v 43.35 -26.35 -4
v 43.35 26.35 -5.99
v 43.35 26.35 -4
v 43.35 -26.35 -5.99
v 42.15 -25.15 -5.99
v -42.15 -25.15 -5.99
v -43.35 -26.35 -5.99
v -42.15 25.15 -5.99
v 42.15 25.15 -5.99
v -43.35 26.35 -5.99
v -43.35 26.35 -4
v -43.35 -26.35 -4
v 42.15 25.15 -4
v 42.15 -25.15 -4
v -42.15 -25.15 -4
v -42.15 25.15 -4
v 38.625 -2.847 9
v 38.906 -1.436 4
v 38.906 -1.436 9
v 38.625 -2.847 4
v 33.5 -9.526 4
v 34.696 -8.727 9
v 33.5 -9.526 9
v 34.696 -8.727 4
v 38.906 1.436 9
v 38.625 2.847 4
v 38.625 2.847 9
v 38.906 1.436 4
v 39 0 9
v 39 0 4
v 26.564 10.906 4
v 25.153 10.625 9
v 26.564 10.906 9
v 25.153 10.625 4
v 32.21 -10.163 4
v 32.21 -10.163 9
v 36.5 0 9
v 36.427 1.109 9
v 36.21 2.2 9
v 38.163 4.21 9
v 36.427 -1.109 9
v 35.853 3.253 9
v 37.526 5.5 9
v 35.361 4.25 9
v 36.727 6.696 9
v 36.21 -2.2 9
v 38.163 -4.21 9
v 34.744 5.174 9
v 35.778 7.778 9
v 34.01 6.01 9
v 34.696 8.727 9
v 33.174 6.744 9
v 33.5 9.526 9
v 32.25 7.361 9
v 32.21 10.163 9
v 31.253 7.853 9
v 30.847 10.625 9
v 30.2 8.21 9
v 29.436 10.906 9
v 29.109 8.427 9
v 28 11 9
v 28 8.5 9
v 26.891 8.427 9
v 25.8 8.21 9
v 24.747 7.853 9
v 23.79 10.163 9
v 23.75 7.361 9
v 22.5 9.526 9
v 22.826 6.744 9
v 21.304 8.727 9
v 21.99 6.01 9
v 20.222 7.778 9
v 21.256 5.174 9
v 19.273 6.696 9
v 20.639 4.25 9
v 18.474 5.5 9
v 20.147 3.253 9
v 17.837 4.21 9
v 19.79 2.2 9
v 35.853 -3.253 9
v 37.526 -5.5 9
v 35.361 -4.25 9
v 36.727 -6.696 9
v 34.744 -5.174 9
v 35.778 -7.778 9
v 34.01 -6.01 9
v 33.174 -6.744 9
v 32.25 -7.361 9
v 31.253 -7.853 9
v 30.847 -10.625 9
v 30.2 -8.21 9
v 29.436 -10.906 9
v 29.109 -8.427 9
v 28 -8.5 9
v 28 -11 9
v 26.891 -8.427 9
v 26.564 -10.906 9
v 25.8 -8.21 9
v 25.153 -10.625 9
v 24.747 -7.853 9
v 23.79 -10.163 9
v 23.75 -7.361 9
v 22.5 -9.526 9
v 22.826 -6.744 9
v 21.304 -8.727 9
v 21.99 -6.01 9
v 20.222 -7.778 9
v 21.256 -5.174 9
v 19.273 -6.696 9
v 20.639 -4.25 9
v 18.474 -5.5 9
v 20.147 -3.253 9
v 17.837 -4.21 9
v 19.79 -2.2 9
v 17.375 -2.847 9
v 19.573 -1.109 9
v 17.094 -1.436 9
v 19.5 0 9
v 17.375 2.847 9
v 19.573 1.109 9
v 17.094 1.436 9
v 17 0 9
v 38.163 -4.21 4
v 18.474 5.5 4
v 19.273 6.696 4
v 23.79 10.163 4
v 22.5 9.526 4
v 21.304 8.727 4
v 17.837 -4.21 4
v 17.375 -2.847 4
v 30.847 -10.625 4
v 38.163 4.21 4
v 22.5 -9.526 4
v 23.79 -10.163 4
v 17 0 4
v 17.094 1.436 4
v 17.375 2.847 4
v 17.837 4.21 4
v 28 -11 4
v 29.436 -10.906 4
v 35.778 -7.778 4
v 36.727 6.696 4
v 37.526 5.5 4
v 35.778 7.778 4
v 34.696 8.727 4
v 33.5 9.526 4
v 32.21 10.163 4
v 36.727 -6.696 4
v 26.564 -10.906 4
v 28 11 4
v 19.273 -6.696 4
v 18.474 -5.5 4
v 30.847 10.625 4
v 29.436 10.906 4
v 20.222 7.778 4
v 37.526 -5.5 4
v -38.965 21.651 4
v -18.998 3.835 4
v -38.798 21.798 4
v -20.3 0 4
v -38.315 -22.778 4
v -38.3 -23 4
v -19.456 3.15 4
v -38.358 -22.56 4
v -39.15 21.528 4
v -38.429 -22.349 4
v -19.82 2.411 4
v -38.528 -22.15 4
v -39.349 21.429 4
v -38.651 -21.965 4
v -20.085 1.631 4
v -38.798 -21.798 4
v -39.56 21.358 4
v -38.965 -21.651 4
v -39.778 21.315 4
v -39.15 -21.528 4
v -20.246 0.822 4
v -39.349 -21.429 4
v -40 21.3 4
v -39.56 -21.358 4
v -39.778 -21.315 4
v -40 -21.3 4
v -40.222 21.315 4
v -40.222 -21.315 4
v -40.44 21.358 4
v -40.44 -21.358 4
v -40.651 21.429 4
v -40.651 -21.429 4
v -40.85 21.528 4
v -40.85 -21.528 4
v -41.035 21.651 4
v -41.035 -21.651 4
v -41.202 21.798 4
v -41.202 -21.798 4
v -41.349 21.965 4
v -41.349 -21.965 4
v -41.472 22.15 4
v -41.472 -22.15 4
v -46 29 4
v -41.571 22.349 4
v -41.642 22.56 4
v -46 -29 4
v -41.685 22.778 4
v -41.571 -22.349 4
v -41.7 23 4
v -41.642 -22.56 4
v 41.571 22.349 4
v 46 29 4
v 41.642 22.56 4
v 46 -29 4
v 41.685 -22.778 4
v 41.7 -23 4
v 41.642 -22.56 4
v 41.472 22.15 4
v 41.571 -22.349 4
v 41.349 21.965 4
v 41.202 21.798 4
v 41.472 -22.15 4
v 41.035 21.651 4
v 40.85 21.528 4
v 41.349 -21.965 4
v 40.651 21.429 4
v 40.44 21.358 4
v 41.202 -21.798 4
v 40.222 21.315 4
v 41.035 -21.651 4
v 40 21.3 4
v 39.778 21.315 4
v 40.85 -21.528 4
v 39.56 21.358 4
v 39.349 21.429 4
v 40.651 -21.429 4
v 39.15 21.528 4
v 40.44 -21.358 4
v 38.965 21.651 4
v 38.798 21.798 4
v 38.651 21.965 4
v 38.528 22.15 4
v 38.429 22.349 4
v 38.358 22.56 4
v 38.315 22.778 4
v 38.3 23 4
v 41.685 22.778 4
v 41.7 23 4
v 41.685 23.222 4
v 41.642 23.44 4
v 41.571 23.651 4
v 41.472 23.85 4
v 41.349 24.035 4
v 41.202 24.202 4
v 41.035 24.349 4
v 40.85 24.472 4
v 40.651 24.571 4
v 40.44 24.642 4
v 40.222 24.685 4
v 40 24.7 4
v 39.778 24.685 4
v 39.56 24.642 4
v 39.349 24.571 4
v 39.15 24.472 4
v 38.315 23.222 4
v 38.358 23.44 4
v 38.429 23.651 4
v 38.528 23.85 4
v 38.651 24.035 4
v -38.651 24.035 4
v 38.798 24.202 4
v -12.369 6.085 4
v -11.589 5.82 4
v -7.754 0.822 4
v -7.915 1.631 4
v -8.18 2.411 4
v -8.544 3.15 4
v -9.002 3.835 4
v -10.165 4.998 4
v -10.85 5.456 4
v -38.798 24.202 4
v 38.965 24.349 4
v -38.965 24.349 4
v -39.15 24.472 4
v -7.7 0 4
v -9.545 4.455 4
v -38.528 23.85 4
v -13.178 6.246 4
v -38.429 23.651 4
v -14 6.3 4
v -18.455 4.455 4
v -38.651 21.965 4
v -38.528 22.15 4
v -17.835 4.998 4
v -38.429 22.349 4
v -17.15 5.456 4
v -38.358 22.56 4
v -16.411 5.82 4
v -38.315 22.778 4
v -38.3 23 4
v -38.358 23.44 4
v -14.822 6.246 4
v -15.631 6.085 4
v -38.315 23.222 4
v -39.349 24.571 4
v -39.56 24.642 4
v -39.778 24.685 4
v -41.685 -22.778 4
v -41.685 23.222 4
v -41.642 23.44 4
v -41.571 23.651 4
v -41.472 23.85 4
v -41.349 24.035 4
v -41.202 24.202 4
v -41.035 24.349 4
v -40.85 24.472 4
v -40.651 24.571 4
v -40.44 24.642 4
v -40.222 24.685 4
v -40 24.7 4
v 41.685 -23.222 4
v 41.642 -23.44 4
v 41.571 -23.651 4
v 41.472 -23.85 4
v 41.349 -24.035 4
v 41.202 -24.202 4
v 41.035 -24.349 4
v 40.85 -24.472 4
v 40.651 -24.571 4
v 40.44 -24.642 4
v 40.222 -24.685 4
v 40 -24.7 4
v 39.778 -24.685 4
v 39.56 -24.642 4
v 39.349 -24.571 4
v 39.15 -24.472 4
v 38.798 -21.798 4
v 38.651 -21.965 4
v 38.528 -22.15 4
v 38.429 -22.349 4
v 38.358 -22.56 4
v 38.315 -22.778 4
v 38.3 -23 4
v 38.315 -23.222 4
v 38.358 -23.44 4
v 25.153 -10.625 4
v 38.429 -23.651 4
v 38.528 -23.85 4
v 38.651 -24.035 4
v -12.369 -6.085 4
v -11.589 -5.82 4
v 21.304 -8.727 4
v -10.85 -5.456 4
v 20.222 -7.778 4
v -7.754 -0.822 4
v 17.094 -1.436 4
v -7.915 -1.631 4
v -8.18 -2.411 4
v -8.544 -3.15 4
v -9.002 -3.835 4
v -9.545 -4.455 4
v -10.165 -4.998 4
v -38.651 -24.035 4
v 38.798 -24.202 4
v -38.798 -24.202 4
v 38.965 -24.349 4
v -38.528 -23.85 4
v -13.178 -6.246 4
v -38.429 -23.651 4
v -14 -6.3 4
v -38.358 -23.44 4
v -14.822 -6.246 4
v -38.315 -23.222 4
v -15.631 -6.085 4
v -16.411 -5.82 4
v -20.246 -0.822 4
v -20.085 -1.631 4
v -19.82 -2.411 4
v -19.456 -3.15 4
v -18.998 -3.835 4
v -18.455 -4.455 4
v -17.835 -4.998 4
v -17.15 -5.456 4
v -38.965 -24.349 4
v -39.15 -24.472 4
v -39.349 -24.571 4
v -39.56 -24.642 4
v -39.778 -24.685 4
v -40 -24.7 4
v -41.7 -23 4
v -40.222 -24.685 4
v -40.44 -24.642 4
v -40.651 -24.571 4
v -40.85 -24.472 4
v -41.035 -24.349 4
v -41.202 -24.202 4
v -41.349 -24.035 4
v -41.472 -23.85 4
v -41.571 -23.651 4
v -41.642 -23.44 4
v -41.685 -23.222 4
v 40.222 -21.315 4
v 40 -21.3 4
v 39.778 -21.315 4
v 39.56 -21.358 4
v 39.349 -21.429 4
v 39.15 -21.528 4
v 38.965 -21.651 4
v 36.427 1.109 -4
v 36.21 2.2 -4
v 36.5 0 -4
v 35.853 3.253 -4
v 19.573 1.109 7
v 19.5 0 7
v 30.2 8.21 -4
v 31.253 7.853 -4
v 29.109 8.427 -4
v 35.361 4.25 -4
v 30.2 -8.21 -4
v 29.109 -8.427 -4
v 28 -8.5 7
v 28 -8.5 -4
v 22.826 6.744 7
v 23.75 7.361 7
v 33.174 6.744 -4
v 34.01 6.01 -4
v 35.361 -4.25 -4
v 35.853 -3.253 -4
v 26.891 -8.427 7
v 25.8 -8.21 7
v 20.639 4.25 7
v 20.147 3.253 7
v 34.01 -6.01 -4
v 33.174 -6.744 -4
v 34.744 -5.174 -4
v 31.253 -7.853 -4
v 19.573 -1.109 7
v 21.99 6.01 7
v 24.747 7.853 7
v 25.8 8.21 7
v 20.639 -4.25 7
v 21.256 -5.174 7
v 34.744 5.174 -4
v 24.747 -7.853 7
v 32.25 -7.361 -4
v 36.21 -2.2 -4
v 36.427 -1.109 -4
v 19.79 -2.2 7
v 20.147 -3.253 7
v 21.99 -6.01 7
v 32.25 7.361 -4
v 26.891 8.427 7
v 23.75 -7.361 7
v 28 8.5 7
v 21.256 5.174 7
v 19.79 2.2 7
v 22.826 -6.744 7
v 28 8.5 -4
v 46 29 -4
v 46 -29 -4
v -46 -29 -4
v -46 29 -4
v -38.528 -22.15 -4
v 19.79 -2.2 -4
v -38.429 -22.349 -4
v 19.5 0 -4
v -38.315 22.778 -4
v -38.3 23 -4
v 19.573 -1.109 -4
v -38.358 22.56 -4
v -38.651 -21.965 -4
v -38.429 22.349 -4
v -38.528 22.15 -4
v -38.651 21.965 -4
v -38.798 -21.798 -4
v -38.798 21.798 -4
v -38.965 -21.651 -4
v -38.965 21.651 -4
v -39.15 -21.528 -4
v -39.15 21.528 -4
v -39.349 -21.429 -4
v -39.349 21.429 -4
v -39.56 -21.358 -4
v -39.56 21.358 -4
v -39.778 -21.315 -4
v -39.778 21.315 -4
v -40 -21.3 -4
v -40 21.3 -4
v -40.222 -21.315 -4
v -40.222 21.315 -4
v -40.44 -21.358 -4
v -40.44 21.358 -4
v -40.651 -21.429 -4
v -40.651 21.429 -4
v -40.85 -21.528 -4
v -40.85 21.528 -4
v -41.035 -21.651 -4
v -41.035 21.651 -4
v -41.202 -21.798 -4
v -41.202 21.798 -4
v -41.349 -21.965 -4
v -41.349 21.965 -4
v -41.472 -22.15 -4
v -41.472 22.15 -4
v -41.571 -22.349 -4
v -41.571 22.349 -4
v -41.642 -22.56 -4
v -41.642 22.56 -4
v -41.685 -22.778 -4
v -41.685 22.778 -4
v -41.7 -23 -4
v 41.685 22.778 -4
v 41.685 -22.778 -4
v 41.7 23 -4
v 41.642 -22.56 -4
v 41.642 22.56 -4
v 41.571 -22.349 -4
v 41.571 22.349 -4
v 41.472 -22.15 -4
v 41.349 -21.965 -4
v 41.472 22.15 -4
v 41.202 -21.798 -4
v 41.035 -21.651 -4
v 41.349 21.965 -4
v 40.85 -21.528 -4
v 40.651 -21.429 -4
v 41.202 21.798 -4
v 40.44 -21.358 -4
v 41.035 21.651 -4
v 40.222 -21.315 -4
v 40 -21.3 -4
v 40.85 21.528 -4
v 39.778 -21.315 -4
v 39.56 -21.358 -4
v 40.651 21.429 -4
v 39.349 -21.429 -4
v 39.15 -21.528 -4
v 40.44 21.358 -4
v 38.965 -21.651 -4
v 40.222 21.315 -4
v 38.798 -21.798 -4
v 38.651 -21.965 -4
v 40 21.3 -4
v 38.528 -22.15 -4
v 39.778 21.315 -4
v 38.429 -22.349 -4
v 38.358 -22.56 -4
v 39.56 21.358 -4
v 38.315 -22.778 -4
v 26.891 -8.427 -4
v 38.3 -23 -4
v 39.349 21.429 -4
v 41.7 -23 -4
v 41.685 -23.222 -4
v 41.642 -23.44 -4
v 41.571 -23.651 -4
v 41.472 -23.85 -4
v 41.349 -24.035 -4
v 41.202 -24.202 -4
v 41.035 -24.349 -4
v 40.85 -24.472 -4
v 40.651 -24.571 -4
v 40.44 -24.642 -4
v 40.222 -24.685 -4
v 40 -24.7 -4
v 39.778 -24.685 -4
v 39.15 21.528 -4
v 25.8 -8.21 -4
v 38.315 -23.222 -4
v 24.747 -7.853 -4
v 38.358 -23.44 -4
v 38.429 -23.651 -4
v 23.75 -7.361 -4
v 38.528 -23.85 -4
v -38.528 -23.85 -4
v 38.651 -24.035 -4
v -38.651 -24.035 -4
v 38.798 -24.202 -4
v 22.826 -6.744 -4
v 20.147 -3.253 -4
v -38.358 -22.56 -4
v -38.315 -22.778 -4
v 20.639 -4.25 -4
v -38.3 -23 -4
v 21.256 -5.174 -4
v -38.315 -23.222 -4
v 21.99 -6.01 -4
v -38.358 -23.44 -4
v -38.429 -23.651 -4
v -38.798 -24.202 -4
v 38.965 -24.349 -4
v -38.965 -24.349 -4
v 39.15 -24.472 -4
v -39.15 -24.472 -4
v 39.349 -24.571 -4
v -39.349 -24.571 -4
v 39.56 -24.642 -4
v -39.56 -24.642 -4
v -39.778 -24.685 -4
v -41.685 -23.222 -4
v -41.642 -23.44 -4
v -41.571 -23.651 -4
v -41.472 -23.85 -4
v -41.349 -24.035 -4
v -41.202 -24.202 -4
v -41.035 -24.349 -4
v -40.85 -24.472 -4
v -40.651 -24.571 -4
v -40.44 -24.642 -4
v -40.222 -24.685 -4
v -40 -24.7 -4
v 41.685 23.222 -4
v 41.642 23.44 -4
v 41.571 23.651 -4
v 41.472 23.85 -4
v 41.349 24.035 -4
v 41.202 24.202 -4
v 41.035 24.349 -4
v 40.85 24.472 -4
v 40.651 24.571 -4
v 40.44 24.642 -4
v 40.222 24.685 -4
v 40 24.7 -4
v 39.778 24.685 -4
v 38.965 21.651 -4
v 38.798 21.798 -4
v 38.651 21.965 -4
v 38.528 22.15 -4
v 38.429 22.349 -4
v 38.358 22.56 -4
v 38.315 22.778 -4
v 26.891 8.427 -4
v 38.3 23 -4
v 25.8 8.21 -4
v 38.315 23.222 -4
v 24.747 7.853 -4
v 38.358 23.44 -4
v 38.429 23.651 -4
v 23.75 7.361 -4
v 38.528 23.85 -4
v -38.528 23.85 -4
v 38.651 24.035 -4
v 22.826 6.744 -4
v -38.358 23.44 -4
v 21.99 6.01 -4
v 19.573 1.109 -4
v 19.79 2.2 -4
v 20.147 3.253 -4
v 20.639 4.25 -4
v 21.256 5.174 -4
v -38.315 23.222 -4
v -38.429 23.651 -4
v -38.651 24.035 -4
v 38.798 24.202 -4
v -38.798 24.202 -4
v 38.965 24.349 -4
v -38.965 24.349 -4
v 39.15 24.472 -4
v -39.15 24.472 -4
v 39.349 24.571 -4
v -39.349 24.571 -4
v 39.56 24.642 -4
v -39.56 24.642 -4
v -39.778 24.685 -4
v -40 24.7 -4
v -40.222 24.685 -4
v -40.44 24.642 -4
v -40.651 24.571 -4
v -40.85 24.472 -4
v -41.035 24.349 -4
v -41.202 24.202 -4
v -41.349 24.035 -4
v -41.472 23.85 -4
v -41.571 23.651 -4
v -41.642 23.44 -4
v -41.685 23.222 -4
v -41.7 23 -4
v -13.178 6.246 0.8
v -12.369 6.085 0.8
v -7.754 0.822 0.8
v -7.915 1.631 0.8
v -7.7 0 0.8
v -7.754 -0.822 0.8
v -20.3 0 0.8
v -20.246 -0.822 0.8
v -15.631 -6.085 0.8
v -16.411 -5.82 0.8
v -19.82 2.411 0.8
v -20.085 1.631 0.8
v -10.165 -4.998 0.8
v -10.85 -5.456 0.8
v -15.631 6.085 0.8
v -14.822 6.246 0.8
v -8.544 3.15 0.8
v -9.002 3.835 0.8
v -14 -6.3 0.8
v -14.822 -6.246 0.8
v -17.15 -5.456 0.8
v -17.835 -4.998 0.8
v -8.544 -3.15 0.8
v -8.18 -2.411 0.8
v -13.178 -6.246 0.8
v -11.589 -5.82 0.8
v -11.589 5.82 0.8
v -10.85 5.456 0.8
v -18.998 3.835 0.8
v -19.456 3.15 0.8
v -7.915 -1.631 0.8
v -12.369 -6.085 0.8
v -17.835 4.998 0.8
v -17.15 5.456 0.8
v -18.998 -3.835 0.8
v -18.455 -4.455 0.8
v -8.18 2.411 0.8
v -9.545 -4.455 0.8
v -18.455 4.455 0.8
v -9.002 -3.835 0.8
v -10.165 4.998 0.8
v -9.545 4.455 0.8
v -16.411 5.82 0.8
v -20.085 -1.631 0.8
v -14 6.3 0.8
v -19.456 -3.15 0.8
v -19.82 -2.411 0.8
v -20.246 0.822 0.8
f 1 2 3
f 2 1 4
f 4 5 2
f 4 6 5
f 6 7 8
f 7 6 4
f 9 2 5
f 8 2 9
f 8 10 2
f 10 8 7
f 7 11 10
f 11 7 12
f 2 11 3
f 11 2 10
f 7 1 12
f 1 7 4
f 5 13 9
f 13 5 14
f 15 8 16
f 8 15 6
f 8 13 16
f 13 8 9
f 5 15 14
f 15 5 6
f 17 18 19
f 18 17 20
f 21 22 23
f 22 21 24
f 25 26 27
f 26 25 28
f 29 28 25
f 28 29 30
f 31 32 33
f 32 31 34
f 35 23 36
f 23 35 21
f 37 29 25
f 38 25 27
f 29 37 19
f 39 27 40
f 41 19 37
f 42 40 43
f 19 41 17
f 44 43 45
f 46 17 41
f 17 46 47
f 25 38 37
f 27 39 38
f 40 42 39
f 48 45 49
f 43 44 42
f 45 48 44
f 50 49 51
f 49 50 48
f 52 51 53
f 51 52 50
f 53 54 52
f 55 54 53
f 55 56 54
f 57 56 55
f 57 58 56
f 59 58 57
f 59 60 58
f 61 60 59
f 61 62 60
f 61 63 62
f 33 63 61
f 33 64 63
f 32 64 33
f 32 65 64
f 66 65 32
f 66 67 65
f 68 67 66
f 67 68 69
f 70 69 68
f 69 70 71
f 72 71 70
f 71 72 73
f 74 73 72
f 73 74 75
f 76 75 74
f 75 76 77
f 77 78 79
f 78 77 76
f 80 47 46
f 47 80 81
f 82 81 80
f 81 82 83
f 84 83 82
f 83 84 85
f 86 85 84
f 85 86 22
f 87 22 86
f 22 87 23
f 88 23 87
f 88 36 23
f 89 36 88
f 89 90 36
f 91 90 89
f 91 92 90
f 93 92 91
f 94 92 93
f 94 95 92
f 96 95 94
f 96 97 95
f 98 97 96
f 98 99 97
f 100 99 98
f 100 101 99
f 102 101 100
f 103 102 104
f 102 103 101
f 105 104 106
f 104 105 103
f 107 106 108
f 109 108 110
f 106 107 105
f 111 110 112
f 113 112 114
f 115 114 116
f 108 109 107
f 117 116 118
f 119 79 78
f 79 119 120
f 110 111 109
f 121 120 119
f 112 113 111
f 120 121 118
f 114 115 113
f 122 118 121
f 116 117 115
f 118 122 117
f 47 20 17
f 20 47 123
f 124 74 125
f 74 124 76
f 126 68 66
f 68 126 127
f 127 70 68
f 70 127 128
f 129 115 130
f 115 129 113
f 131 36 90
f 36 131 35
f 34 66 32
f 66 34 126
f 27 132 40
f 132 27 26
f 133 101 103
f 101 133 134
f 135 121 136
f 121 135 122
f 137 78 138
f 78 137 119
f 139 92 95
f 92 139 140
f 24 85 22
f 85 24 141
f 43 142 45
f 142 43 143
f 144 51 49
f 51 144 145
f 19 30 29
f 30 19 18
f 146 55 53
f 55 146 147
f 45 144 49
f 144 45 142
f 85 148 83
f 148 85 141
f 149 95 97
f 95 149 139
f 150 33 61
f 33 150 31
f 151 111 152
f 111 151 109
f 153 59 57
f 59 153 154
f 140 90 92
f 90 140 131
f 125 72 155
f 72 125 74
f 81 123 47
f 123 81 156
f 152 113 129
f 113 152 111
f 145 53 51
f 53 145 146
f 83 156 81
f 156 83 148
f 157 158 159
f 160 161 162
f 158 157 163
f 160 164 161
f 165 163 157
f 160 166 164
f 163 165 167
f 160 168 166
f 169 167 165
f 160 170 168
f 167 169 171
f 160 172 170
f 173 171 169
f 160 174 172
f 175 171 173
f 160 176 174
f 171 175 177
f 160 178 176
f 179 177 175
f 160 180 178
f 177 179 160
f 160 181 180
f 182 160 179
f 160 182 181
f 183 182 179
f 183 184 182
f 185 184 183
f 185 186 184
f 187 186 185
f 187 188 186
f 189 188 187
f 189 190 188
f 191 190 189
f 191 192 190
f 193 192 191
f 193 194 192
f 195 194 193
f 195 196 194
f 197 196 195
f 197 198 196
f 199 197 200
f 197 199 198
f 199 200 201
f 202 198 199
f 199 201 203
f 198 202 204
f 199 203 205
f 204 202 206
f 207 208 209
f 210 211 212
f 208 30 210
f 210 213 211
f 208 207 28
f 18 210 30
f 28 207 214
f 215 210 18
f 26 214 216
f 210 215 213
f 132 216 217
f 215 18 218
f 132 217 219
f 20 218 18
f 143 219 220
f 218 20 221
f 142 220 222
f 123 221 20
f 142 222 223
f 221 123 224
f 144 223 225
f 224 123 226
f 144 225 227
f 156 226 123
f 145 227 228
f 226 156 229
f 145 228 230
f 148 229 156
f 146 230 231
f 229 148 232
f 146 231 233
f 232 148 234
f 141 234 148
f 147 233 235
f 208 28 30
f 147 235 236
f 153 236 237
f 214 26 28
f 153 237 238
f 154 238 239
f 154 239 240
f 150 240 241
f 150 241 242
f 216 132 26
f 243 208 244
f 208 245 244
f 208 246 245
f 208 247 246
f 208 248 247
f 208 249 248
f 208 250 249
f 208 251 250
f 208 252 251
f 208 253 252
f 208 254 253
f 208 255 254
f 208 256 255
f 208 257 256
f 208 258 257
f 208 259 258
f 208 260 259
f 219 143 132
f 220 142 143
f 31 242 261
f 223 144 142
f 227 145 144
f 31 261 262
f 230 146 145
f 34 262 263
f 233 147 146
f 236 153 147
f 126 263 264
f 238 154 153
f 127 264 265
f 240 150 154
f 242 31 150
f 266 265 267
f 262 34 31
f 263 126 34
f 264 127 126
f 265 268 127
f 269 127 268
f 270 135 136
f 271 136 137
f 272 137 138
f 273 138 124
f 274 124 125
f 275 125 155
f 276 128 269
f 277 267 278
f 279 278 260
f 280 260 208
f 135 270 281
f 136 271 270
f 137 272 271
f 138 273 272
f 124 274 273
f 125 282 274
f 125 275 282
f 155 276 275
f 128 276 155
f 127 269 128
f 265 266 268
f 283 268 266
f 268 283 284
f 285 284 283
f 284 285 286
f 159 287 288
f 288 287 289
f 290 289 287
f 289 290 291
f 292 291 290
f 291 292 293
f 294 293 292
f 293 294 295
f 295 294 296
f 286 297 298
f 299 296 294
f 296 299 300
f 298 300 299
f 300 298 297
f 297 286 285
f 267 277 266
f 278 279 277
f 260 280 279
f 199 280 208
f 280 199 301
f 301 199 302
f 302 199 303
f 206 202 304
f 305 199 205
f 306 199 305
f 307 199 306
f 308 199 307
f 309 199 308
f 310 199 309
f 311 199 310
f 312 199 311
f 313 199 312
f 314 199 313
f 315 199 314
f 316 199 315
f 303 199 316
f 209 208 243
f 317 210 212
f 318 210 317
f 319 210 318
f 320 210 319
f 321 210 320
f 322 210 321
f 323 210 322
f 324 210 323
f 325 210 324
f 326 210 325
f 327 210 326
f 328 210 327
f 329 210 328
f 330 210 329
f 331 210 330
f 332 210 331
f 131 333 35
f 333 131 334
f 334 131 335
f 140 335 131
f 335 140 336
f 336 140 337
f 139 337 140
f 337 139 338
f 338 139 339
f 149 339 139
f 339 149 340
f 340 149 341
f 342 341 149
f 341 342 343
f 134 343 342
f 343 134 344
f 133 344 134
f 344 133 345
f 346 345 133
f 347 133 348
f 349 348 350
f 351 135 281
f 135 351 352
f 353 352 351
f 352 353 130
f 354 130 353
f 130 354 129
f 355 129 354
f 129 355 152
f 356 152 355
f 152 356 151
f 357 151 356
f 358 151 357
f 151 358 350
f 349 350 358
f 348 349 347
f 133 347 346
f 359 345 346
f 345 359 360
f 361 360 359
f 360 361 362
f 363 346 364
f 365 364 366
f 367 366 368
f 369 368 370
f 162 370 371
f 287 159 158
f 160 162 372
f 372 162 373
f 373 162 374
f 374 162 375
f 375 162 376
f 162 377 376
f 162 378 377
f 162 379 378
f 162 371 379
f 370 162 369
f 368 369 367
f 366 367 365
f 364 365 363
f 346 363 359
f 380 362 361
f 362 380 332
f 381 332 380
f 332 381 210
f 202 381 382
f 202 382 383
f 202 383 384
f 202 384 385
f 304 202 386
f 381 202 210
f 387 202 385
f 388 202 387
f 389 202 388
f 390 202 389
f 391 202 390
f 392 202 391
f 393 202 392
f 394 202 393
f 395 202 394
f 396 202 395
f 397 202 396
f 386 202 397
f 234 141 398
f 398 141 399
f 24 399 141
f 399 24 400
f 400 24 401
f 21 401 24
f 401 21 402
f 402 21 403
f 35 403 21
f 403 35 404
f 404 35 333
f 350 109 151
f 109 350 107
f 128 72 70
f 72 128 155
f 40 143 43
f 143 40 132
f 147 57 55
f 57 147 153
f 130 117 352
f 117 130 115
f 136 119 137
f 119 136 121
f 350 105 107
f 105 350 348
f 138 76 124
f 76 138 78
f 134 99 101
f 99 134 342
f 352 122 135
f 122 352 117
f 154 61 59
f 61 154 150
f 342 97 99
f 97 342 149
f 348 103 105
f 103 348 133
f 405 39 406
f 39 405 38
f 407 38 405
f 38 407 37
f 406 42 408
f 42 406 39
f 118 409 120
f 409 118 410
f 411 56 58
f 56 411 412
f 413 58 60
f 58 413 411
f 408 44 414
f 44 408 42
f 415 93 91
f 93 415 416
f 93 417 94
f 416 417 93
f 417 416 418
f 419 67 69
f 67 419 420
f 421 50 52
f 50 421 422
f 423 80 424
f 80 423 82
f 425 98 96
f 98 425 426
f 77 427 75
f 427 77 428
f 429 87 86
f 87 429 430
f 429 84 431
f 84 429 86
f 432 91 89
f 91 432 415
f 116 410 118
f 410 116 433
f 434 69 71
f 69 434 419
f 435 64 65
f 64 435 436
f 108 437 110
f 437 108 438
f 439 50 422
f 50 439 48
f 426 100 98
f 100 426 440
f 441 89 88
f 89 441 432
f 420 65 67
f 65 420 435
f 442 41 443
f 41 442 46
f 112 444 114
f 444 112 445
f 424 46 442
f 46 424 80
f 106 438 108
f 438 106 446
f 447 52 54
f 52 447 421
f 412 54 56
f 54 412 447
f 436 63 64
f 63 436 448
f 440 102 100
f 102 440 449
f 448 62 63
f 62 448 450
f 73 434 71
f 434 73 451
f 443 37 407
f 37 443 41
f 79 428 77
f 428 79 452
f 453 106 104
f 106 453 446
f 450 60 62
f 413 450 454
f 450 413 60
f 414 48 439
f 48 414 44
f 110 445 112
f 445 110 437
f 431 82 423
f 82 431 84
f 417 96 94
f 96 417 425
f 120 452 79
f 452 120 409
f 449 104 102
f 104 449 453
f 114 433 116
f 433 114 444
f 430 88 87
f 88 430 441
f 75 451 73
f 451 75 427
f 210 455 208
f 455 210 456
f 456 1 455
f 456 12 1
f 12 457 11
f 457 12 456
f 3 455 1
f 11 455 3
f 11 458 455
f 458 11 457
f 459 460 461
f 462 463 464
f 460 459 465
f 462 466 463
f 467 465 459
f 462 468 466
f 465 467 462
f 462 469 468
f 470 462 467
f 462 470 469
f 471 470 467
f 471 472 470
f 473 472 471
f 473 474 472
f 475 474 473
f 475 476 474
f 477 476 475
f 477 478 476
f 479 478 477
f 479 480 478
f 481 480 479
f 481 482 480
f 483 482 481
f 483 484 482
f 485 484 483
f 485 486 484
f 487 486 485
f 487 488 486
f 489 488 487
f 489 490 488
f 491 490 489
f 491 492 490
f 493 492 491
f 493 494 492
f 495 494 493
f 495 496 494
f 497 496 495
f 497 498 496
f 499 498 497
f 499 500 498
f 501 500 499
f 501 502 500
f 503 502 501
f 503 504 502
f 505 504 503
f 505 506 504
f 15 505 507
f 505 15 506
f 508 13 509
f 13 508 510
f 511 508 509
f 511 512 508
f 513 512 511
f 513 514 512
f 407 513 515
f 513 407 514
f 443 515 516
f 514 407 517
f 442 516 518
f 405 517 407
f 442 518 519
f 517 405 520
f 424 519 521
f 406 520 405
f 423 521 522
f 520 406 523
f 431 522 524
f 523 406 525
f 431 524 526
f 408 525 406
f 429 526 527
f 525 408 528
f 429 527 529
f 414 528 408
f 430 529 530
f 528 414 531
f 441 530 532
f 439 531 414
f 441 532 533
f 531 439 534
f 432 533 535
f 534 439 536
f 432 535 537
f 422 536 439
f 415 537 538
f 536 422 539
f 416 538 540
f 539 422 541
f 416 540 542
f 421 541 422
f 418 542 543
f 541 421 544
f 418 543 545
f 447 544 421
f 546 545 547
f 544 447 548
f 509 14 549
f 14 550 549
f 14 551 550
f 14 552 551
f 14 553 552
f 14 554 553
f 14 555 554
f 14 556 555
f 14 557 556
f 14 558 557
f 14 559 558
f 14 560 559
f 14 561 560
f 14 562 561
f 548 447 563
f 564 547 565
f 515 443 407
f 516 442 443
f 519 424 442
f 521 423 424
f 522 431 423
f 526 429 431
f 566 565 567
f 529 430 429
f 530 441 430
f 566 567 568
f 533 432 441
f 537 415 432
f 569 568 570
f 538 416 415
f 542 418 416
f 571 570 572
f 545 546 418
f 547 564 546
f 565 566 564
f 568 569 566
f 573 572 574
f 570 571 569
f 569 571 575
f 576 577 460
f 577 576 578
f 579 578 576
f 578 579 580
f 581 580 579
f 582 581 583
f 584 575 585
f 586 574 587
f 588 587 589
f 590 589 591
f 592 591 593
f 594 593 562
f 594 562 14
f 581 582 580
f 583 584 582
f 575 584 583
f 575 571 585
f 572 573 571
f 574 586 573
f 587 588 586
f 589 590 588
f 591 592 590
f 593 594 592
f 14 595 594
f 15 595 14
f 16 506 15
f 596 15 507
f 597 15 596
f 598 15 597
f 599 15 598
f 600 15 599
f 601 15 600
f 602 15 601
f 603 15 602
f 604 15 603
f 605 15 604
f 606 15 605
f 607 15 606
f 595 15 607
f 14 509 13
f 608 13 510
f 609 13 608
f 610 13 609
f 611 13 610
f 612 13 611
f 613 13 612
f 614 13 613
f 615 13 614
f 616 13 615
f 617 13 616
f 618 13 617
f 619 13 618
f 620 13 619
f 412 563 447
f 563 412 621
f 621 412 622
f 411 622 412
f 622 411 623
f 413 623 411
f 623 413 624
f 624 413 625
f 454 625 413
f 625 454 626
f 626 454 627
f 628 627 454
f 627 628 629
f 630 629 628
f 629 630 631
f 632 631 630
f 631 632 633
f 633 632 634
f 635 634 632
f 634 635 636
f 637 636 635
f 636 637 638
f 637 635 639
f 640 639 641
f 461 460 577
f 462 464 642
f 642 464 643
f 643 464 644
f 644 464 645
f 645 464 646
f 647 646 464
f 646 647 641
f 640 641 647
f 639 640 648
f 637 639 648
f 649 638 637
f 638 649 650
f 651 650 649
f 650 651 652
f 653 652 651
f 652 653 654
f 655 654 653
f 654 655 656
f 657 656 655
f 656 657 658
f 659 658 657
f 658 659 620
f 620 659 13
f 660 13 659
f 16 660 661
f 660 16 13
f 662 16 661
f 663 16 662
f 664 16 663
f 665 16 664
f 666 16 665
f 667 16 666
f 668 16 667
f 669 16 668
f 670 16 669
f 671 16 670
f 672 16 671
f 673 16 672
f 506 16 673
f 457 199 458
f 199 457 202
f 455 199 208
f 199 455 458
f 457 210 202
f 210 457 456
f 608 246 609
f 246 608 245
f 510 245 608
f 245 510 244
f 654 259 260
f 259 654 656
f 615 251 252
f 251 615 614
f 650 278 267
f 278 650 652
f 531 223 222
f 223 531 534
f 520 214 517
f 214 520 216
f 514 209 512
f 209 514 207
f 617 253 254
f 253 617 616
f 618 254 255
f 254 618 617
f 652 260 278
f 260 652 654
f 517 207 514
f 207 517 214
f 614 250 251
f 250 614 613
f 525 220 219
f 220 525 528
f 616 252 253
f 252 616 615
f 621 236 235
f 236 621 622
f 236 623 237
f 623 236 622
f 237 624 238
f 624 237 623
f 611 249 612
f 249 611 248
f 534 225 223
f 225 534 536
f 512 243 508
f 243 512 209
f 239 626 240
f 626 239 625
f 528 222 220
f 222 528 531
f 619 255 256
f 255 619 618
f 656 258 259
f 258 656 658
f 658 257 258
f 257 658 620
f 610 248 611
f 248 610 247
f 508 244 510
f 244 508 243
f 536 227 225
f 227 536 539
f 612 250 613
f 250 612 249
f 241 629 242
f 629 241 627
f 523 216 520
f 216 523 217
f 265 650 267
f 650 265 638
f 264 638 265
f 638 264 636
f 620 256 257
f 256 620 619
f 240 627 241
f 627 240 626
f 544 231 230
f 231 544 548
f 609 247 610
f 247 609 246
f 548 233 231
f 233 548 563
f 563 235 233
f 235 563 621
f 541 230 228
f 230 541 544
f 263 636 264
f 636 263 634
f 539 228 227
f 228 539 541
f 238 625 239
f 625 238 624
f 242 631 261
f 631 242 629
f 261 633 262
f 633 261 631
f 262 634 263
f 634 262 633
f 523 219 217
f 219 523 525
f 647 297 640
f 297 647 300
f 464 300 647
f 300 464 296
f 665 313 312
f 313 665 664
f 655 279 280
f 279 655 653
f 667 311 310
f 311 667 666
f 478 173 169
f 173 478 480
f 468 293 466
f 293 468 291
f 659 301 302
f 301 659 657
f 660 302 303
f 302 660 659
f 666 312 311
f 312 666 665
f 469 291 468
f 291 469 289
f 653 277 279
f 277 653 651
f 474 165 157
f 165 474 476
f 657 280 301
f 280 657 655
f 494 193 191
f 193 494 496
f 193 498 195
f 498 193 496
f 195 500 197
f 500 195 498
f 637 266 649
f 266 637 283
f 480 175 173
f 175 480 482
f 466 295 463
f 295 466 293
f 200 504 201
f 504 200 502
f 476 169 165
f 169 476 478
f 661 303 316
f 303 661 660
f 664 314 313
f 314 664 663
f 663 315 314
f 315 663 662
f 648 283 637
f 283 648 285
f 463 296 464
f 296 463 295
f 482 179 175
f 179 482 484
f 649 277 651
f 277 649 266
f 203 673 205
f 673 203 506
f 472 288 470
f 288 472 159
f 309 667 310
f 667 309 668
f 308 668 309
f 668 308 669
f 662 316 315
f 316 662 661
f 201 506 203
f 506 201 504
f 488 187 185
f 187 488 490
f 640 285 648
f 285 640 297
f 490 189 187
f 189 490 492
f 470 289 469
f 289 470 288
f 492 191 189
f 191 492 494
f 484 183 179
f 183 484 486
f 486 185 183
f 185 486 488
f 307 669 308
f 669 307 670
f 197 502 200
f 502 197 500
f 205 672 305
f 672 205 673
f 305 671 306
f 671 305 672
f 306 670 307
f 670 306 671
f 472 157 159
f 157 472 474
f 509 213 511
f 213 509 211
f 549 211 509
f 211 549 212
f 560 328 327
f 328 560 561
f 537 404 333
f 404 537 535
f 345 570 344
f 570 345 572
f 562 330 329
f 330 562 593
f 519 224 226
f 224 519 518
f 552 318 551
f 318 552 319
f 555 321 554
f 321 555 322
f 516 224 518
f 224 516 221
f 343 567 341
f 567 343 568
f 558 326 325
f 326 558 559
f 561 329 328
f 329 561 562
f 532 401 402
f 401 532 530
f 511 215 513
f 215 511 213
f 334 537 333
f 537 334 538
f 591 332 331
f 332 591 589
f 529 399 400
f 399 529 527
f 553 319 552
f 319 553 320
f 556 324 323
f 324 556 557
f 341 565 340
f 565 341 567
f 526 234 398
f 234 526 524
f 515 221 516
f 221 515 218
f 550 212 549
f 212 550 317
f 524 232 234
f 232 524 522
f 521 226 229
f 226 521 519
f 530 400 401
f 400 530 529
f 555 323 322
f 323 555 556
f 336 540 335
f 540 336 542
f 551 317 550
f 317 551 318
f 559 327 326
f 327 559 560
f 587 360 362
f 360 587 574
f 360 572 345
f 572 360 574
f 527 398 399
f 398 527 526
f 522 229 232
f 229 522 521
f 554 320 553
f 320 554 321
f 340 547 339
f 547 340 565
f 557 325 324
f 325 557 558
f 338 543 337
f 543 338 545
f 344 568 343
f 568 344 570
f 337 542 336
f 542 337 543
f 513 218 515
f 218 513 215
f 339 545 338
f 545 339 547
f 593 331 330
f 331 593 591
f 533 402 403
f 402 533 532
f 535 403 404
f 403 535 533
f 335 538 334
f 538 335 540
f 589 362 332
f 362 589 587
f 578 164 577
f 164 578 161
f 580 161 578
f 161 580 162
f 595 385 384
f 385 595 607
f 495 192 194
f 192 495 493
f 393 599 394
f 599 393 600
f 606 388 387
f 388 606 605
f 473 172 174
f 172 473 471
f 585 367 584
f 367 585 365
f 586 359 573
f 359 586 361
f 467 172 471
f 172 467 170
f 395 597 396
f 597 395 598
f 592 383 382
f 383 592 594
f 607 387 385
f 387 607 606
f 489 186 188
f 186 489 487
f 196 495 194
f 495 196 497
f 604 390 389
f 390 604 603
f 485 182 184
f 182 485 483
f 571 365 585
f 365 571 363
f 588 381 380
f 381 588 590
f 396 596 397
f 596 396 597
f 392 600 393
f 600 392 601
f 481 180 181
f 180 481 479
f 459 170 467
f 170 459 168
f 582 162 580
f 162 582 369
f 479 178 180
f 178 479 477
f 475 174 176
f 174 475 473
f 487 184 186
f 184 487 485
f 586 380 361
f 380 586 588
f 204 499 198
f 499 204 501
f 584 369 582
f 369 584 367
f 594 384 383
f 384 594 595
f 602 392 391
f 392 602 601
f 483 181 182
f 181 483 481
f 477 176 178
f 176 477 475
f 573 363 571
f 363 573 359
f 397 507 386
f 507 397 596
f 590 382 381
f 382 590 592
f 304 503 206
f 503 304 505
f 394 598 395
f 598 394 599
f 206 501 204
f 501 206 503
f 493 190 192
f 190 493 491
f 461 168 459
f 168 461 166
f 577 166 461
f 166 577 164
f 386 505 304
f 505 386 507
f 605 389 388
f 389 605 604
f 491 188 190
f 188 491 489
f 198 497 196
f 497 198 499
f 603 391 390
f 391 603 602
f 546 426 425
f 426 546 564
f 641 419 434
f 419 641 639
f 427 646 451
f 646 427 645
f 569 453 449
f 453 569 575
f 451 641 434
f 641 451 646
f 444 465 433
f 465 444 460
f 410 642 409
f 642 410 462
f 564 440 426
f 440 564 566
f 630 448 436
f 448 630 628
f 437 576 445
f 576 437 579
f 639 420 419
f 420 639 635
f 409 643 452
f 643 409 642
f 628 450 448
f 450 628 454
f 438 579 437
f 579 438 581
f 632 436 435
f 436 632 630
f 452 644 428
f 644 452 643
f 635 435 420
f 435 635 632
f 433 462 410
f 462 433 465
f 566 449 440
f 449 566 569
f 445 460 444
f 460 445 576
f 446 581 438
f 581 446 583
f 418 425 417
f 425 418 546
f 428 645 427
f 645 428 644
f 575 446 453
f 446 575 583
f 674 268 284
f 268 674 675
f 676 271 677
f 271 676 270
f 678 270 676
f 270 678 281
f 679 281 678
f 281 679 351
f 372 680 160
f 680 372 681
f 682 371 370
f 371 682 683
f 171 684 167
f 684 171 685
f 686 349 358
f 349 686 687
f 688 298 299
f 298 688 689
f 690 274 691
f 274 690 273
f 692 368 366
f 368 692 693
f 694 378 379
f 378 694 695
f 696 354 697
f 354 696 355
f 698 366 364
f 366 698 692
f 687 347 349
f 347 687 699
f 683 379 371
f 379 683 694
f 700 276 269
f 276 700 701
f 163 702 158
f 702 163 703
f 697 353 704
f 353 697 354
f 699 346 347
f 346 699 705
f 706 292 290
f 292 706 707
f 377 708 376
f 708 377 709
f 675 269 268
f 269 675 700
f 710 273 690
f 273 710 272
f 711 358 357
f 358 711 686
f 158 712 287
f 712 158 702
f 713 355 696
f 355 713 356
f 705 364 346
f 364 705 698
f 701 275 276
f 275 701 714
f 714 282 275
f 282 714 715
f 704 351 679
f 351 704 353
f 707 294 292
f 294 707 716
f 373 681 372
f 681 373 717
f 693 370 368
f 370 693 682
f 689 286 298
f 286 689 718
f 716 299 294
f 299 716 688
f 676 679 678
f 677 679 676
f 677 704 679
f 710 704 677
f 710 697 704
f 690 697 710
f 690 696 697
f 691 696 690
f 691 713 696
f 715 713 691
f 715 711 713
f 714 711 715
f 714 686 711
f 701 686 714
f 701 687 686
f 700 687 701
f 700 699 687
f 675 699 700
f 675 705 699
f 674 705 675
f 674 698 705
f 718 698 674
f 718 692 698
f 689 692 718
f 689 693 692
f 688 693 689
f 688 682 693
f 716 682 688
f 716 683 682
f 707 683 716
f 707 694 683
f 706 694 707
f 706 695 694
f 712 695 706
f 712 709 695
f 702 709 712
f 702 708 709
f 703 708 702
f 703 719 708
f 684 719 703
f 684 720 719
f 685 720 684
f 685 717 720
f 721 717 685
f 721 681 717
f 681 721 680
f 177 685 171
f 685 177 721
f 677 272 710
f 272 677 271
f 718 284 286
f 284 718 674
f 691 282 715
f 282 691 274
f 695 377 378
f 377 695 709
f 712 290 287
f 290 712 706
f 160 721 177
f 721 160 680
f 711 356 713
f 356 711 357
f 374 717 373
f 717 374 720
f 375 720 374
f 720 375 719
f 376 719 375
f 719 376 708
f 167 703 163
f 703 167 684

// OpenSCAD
// file: box_params.scad
// box_params.scad — Indutor Dynavap v3.2
// Espelha maquetes/dimensions.json (corpo 92×58×65 + tampa 8).
// Coordenadas OpenSCAD (impressão): X=largura, Y=profundidade (frente=+Y), Z=altura.

BOX_W = 92;
BOX_D = 58;
BOX_H = 65;
WALL  = 2.5;
FLOOR = 2.5;
LID_H = 8;

// Câmara (tubo) — offset à direita do centro
TUBE_X      = 28;
TUBE_HOLE_R = 8.5;   // Ø17 clearance para OD16 + folga
COLLAR_OD   = 22;
COLLAR_ID   = 17;
COLLAR_H    = 5;

// Ímã de descanso — centro da área livre da tampa (sem o bocal/collarinho)
// Área livre X: (-BOX_W/2+2) … (TUBE_X-COLLAR_OD/2-1.5) → centro ≈ -14
MAGNET_X    = -14;
MAGNET_Y    = 0;
MAGNET_D    = 12;    // disco alvo Ø12
MAGNET_H    = 3;     // espessura 3 mm (use 6 p/ boss extra)
MAGNET_CLR_D = 0.6;  // folga diametral total → pocket Ø12.6
MAGNET_CLR_H = 0.2;  // folga profundidade → 3.2 mm
POCKET_D    = MAGNET_D + MAGNET_CLR_D;
POCKET_H    = MAGNET_H + MAGNET_CLR_H;
// Se MAGNET_H > LID_H - 4, gera boss local
MAGNET_BOSS = (MAGNET_H > 3) ? (MAGNET_H - 3) : 0;

// Ventilação traseira (−Y)
VENT_N = 4;
VENT_W = 10;
VENT_H = 4;
VENT_Z = 12;         // altura do centro do slot a partir do piso interno

// Painel frontal (+Y) — Y absolutos do JSON → Z na peça
// A7 KCD1-106N redonda Ø20; A5 WH148 bushing Ø7.6; A6 Ø19.2; A9 Ø5.2
ROCK_X = -32; ROCK_Z = 18; ROCK_R = 10.1;  // Ø20.2
POT_X  = -12; POT_Z  = 42; POT_R  = 3.8;   // Ø7.6
BTN_X  =  12; BTN_Z  = 35; BTN_R  = 9.6;   // Ø19.2
LED1_X =  28; LED1_Z = 48; LED_R  = 2.6;   // Ø5.2
LED2_X =  38; LED2_Z = 48;

// Jack DC-022 Ø8.2 + porta-fusível 5×20 painel Ø13.2 (traseira −Y)
JACK_X = 0;  JACK_Z = 22; JACK_R = 4.1;
FUSE_X = 22; FUSE_Z = 22; FUSE_R = 6.6;

// Parafusos tampa M3 (furos 3.4 mm)
SCREW_R = 1.7;
SCREW_INSET = 6;     // margem da borda até centro do furo
LIP_H = 2;           // ressalto interno da tampa (encaixe)
LIP_CLR = 0.3;       // folga do lip vs interno

// ── Alto relevo tribal (decals/*.stl) ──
EMBOSS_H      = 0.8;   // altura do relevo (mm) — camada extra p/ filament claro
EMBOSS_MARGIN = 2.0;   // margem mínima das arestas (preencher área livre)
BOTTOM_PAD_H  = 1.0;   // pads nos cantos (assento estável)
KEEPOUT_CLR   = 1.5;   // folga ao redor de furos

// Larguras alvo dos STL gerados (ver vectorize_decals.py)
DECAL1_W = 70;   // laterais — escala por face
DECAL2_W = 36;   // tampa — área livre (sem bocal); ímã no centro
DECAL3_W = 42;   // base — cabe em 92×58 com margem

$fn = 48;

function screw_xy() = [
  [ BOX_W/2 - SCREW_INSET,  BOX_D/2 - SCREW_INSET],
  [-BOX_W/2 + SCREW_INSET,  BOX_D/2 - SCREW_INSET],
  [ BOX_W/2 - SCREW_INSET, -BOX_D/2 + SCREW_INSET],
  [-BOX_W/2 + SCREW_INSET, -BOX_D/2 + SCREW_INSET]
];
// main file
// box_lid.scad — Tampa + ímã (relevo tribal 2 via assemble_embossed.py)
include <box_params.scad>

module lid_plate() {
  cube([BOX_W, BOX_D, LID_H], center = true);
}

module lid_lip() {
  iw = BOX_W - 2*WALL - LIP_CLR;
  id = BOX_D - 2*WALL - LIP_CLR;
  translate([0, 0, -LID_H/2 - LIP_H/2 + 0.01])
    difference() {
      cube([iw, id, LIP_H], center = true);
      cube([iw - 2.4, id - 2.4, LIP_H + 1], center = true);
    }
}

module tube_hole() {
  translate([TUBE_X, 0, 0])
    cylinder(h = LID_H + LIP_H + 4, r = TUBE_HOLE_R, center = true);
}

module collar() {
  translate([TUBE_X, 0, LID_H/2 + COLLAR_H/2])
    difference() {
      cylinder(h = COLLAR_H, r = COLLAR_OD/2, center = true);
      cylinder(h = COLLAR_H + 1, r = COLLAR_ID/2, center = true);
    }
}

module magnet_boss() {
  if (MAGNET_BOSS > 0) {
    translate([MAGNET_X, MAGNET_Y, LID_H/2 + MAGNET_BOSS/2])
      cylinder(h = MAGNET_BOSS, r = POCKET_D/2 + 2, center = true);
  }
}

module magnet_pocket() {
  top_z = LID_H/2 + MAGNET_BOSS;
  translate([MAGNET_X, MAGNET_Y, top_z - POCKET_H/2 + 0.01])
    cylinder(h = POCKET_H + 0.02, r = POCKET_D/2, center = true);
}

module screw_holes() {
  for (p = screw_xy()) {
    translate([p[0], p[1], 0])
      cylinder(h = LID_H + 4, r = SCREW_R, center = true);
  }
}

module box_lid() {
  difference() {
    union() {
      lid_plate();
      lid_lip();
      collar();
      magnet_boss();
    }
    tube_hole();
    magnet_pocket();
    screw_holes();
  }
}

box_lid();
